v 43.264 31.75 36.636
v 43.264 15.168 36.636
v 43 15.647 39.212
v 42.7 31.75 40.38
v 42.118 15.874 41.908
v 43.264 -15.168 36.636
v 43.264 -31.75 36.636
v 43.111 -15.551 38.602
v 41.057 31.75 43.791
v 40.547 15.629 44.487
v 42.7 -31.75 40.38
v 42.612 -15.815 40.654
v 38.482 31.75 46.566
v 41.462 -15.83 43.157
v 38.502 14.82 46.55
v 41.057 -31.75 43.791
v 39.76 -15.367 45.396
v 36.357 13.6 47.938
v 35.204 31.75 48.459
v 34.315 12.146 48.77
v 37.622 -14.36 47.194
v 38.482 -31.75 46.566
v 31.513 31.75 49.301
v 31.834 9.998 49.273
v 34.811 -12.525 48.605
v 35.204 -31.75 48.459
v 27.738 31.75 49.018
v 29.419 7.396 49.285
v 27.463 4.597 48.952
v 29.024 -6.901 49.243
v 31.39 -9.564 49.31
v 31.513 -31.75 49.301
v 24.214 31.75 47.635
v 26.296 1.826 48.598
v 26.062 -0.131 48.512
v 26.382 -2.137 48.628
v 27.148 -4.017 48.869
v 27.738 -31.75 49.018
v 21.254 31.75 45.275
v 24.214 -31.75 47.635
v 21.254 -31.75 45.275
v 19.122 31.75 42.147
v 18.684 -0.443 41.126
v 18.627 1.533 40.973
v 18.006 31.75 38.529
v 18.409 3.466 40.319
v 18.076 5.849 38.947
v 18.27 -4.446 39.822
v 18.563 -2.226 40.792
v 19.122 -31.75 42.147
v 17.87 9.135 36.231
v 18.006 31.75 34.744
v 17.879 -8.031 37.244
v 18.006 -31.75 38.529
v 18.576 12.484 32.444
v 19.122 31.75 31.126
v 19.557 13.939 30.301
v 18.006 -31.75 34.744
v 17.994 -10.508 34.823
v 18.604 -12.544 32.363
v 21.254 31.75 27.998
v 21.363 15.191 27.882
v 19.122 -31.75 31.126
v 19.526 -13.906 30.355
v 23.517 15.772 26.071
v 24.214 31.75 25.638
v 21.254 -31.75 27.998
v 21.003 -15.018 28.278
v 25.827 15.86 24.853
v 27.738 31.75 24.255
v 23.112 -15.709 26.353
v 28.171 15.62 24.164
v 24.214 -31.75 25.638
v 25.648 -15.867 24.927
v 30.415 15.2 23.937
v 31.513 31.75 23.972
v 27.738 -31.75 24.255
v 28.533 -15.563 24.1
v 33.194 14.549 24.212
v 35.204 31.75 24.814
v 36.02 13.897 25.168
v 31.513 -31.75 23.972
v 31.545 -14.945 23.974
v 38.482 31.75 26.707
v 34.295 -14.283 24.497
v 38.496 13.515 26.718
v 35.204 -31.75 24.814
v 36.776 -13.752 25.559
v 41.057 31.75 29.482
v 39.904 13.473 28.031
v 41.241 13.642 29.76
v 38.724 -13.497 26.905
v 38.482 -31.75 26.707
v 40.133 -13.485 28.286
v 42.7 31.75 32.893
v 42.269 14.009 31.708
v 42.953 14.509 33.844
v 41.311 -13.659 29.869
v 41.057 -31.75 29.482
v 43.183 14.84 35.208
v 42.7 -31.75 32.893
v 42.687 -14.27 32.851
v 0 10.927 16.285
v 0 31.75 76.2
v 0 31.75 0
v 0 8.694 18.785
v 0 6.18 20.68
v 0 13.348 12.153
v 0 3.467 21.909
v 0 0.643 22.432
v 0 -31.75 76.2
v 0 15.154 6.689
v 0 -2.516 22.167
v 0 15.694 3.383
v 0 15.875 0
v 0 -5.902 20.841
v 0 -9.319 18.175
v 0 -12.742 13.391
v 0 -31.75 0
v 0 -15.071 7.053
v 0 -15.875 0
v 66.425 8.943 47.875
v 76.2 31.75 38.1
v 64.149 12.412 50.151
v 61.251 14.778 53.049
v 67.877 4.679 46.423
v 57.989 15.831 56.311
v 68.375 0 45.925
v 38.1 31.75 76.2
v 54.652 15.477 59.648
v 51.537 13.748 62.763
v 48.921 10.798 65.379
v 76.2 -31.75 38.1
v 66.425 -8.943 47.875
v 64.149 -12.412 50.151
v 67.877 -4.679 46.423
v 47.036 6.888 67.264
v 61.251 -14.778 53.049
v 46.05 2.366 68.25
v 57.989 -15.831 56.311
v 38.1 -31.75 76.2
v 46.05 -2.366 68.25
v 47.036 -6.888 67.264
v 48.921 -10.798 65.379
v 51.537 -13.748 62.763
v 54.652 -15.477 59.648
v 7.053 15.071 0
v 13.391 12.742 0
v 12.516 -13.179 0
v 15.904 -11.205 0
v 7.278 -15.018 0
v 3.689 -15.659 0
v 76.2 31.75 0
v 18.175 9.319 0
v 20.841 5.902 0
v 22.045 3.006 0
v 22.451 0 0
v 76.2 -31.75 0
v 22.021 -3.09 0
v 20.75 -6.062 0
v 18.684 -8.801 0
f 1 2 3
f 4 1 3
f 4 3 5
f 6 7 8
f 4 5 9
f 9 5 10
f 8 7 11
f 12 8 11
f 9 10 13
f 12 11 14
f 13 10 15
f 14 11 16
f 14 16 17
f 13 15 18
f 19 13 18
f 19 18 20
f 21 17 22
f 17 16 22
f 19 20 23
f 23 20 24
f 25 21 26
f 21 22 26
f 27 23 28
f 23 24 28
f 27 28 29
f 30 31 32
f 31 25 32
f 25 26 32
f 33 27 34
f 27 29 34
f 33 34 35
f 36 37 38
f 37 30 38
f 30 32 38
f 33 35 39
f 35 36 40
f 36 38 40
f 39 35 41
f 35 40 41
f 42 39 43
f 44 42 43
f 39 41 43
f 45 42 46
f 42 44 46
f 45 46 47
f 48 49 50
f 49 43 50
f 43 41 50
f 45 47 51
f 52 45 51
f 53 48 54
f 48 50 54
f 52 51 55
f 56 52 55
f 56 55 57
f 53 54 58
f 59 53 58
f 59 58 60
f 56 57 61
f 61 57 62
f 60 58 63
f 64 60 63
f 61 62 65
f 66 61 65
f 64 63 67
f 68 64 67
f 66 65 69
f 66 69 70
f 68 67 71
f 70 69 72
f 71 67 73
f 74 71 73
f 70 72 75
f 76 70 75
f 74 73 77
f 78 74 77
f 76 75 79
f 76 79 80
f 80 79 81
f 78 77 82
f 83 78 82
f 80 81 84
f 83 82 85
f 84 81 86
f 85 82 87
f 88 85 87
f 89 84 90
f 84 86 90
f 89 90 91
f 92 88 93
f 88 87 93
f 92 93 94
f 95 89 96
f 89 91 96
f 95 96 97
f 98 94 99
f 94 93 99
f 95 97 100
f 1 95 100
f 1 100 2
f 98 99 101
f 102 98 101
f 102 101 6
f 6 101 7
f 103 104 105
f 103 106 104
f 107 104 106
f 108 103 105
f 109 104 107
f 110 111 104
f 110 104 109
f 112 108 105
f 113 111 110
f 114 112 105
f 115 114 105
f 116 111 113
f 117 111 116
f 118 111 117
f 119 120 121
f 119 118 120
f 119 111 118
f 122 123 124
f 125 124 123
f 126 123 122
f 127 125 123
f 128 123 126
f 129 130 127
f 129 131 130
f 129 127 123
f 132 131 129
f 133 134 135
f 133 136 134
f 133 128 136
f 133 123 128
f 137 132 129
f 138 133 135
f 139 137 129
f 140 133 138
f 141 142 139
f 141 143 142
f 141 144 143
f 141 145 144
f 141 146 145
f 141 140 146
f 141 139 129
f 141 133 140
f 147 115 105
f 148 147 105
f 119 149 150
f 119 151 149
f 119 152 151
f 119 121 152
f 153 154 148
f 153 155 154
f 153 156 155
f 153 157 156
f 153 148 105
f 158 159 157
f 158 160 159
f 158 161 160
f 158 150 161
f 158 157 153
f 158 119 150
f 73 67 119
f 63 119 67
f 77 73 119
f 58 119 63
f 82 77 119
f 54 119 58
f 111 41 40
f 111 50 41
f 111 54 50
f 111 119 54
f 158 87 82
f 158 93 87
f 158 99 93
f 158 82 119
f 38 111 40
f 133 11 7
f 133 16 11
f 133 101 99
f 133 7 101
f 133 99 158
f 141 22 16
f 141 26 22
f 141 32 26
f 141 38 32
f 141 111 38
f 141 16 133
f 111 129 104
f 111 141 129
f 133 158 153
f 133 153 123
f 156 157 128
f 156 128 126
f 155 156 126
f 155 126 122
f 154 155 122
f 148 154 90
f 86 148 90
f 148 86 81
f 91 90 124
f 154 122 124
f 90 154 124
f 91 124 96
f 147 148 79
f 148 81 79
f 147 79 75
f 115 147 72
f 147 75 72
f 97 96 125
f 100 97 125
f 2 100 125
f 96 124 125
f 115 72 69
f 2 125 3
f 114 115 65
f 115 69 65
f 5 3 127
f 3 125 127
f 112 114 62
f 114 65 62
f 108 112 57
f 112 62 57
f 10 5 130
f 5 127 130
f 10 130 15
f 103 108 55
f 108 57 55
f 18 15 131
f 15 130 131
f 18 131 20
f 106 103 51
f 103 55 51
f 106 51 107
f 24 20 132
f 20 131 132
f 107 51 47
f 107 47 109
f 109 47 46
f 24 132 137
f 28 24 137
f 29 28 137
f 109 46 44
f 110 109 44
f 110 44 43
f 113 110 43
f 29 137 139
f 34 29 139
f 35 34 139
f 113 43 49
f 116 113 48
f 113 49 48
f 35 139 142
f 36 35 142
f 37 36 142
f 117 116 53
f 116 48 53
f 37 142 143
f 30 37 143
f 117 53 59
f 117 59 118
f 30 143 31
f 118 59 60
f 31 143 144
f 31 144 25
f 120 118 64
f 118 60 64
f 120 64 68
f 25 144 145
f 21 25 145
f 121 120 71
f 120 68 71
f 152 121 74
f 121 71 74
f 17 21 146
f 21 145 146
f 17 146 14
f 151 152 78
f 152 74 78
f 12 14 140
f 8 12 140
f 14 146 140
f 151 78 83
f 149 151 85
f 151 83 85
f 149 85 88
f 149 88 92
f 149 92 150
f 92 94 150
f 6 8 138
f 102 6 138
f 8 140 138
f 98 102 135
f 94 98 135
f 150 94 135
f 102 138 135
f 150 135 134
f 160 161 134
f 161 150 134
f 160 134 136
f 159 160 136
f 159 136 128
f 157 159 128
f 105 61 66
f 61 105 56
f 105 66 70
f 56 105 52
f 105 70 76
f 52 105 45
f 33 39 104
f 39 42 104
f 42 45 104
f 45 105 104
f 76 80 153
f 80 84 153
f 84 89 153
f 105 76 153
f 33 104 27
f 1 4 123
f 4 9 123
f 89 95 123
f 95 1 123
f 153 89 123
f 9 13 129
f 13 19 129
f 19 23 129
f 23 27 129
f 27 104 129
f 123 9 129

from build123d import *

# Parameters (mm, degrees)
F1_DEPTH = 31.75
F2_R     = 15.875
F3_DEPTH = 80.823305
F4_R     = 12.7
F5_DEPTH = 63.501


with BuildPart() as f1:
    # F0 (on Front) → F1 (new body, symmetric)
    with BuildSketch(Plane.XZ):
        Polygon((0, 76.2), (0, 0), (76.2, 0), (76.2, 38.1), (38.1, 76.2), align=None)
    extrude(amount=F1_DEPTH, both=True)

    # F2 (on face) → F3 (cut, through all)
    with BuildSketch(Plane(origin=(57.15, 0, 57.15), x_dir=(0.707107, 0, -0.707107), z_dir=(0.707107, 0, 0.707107))):
        Circle(F2_R)
    extrude(amount=-F3_DEPTH, mode=Mode.SUBTRACT)

    # F4 (on face) → F5 (cut, through all)
    with BuildSketch(Plane.XZ.offset(31.75)):
        with Locations((30.563999, 36.636498)):
            Circle(F4_R)
    extrude(amount=-F5_DEPTH, mode=Mode.SUBTRACT)


solid = f1.part
